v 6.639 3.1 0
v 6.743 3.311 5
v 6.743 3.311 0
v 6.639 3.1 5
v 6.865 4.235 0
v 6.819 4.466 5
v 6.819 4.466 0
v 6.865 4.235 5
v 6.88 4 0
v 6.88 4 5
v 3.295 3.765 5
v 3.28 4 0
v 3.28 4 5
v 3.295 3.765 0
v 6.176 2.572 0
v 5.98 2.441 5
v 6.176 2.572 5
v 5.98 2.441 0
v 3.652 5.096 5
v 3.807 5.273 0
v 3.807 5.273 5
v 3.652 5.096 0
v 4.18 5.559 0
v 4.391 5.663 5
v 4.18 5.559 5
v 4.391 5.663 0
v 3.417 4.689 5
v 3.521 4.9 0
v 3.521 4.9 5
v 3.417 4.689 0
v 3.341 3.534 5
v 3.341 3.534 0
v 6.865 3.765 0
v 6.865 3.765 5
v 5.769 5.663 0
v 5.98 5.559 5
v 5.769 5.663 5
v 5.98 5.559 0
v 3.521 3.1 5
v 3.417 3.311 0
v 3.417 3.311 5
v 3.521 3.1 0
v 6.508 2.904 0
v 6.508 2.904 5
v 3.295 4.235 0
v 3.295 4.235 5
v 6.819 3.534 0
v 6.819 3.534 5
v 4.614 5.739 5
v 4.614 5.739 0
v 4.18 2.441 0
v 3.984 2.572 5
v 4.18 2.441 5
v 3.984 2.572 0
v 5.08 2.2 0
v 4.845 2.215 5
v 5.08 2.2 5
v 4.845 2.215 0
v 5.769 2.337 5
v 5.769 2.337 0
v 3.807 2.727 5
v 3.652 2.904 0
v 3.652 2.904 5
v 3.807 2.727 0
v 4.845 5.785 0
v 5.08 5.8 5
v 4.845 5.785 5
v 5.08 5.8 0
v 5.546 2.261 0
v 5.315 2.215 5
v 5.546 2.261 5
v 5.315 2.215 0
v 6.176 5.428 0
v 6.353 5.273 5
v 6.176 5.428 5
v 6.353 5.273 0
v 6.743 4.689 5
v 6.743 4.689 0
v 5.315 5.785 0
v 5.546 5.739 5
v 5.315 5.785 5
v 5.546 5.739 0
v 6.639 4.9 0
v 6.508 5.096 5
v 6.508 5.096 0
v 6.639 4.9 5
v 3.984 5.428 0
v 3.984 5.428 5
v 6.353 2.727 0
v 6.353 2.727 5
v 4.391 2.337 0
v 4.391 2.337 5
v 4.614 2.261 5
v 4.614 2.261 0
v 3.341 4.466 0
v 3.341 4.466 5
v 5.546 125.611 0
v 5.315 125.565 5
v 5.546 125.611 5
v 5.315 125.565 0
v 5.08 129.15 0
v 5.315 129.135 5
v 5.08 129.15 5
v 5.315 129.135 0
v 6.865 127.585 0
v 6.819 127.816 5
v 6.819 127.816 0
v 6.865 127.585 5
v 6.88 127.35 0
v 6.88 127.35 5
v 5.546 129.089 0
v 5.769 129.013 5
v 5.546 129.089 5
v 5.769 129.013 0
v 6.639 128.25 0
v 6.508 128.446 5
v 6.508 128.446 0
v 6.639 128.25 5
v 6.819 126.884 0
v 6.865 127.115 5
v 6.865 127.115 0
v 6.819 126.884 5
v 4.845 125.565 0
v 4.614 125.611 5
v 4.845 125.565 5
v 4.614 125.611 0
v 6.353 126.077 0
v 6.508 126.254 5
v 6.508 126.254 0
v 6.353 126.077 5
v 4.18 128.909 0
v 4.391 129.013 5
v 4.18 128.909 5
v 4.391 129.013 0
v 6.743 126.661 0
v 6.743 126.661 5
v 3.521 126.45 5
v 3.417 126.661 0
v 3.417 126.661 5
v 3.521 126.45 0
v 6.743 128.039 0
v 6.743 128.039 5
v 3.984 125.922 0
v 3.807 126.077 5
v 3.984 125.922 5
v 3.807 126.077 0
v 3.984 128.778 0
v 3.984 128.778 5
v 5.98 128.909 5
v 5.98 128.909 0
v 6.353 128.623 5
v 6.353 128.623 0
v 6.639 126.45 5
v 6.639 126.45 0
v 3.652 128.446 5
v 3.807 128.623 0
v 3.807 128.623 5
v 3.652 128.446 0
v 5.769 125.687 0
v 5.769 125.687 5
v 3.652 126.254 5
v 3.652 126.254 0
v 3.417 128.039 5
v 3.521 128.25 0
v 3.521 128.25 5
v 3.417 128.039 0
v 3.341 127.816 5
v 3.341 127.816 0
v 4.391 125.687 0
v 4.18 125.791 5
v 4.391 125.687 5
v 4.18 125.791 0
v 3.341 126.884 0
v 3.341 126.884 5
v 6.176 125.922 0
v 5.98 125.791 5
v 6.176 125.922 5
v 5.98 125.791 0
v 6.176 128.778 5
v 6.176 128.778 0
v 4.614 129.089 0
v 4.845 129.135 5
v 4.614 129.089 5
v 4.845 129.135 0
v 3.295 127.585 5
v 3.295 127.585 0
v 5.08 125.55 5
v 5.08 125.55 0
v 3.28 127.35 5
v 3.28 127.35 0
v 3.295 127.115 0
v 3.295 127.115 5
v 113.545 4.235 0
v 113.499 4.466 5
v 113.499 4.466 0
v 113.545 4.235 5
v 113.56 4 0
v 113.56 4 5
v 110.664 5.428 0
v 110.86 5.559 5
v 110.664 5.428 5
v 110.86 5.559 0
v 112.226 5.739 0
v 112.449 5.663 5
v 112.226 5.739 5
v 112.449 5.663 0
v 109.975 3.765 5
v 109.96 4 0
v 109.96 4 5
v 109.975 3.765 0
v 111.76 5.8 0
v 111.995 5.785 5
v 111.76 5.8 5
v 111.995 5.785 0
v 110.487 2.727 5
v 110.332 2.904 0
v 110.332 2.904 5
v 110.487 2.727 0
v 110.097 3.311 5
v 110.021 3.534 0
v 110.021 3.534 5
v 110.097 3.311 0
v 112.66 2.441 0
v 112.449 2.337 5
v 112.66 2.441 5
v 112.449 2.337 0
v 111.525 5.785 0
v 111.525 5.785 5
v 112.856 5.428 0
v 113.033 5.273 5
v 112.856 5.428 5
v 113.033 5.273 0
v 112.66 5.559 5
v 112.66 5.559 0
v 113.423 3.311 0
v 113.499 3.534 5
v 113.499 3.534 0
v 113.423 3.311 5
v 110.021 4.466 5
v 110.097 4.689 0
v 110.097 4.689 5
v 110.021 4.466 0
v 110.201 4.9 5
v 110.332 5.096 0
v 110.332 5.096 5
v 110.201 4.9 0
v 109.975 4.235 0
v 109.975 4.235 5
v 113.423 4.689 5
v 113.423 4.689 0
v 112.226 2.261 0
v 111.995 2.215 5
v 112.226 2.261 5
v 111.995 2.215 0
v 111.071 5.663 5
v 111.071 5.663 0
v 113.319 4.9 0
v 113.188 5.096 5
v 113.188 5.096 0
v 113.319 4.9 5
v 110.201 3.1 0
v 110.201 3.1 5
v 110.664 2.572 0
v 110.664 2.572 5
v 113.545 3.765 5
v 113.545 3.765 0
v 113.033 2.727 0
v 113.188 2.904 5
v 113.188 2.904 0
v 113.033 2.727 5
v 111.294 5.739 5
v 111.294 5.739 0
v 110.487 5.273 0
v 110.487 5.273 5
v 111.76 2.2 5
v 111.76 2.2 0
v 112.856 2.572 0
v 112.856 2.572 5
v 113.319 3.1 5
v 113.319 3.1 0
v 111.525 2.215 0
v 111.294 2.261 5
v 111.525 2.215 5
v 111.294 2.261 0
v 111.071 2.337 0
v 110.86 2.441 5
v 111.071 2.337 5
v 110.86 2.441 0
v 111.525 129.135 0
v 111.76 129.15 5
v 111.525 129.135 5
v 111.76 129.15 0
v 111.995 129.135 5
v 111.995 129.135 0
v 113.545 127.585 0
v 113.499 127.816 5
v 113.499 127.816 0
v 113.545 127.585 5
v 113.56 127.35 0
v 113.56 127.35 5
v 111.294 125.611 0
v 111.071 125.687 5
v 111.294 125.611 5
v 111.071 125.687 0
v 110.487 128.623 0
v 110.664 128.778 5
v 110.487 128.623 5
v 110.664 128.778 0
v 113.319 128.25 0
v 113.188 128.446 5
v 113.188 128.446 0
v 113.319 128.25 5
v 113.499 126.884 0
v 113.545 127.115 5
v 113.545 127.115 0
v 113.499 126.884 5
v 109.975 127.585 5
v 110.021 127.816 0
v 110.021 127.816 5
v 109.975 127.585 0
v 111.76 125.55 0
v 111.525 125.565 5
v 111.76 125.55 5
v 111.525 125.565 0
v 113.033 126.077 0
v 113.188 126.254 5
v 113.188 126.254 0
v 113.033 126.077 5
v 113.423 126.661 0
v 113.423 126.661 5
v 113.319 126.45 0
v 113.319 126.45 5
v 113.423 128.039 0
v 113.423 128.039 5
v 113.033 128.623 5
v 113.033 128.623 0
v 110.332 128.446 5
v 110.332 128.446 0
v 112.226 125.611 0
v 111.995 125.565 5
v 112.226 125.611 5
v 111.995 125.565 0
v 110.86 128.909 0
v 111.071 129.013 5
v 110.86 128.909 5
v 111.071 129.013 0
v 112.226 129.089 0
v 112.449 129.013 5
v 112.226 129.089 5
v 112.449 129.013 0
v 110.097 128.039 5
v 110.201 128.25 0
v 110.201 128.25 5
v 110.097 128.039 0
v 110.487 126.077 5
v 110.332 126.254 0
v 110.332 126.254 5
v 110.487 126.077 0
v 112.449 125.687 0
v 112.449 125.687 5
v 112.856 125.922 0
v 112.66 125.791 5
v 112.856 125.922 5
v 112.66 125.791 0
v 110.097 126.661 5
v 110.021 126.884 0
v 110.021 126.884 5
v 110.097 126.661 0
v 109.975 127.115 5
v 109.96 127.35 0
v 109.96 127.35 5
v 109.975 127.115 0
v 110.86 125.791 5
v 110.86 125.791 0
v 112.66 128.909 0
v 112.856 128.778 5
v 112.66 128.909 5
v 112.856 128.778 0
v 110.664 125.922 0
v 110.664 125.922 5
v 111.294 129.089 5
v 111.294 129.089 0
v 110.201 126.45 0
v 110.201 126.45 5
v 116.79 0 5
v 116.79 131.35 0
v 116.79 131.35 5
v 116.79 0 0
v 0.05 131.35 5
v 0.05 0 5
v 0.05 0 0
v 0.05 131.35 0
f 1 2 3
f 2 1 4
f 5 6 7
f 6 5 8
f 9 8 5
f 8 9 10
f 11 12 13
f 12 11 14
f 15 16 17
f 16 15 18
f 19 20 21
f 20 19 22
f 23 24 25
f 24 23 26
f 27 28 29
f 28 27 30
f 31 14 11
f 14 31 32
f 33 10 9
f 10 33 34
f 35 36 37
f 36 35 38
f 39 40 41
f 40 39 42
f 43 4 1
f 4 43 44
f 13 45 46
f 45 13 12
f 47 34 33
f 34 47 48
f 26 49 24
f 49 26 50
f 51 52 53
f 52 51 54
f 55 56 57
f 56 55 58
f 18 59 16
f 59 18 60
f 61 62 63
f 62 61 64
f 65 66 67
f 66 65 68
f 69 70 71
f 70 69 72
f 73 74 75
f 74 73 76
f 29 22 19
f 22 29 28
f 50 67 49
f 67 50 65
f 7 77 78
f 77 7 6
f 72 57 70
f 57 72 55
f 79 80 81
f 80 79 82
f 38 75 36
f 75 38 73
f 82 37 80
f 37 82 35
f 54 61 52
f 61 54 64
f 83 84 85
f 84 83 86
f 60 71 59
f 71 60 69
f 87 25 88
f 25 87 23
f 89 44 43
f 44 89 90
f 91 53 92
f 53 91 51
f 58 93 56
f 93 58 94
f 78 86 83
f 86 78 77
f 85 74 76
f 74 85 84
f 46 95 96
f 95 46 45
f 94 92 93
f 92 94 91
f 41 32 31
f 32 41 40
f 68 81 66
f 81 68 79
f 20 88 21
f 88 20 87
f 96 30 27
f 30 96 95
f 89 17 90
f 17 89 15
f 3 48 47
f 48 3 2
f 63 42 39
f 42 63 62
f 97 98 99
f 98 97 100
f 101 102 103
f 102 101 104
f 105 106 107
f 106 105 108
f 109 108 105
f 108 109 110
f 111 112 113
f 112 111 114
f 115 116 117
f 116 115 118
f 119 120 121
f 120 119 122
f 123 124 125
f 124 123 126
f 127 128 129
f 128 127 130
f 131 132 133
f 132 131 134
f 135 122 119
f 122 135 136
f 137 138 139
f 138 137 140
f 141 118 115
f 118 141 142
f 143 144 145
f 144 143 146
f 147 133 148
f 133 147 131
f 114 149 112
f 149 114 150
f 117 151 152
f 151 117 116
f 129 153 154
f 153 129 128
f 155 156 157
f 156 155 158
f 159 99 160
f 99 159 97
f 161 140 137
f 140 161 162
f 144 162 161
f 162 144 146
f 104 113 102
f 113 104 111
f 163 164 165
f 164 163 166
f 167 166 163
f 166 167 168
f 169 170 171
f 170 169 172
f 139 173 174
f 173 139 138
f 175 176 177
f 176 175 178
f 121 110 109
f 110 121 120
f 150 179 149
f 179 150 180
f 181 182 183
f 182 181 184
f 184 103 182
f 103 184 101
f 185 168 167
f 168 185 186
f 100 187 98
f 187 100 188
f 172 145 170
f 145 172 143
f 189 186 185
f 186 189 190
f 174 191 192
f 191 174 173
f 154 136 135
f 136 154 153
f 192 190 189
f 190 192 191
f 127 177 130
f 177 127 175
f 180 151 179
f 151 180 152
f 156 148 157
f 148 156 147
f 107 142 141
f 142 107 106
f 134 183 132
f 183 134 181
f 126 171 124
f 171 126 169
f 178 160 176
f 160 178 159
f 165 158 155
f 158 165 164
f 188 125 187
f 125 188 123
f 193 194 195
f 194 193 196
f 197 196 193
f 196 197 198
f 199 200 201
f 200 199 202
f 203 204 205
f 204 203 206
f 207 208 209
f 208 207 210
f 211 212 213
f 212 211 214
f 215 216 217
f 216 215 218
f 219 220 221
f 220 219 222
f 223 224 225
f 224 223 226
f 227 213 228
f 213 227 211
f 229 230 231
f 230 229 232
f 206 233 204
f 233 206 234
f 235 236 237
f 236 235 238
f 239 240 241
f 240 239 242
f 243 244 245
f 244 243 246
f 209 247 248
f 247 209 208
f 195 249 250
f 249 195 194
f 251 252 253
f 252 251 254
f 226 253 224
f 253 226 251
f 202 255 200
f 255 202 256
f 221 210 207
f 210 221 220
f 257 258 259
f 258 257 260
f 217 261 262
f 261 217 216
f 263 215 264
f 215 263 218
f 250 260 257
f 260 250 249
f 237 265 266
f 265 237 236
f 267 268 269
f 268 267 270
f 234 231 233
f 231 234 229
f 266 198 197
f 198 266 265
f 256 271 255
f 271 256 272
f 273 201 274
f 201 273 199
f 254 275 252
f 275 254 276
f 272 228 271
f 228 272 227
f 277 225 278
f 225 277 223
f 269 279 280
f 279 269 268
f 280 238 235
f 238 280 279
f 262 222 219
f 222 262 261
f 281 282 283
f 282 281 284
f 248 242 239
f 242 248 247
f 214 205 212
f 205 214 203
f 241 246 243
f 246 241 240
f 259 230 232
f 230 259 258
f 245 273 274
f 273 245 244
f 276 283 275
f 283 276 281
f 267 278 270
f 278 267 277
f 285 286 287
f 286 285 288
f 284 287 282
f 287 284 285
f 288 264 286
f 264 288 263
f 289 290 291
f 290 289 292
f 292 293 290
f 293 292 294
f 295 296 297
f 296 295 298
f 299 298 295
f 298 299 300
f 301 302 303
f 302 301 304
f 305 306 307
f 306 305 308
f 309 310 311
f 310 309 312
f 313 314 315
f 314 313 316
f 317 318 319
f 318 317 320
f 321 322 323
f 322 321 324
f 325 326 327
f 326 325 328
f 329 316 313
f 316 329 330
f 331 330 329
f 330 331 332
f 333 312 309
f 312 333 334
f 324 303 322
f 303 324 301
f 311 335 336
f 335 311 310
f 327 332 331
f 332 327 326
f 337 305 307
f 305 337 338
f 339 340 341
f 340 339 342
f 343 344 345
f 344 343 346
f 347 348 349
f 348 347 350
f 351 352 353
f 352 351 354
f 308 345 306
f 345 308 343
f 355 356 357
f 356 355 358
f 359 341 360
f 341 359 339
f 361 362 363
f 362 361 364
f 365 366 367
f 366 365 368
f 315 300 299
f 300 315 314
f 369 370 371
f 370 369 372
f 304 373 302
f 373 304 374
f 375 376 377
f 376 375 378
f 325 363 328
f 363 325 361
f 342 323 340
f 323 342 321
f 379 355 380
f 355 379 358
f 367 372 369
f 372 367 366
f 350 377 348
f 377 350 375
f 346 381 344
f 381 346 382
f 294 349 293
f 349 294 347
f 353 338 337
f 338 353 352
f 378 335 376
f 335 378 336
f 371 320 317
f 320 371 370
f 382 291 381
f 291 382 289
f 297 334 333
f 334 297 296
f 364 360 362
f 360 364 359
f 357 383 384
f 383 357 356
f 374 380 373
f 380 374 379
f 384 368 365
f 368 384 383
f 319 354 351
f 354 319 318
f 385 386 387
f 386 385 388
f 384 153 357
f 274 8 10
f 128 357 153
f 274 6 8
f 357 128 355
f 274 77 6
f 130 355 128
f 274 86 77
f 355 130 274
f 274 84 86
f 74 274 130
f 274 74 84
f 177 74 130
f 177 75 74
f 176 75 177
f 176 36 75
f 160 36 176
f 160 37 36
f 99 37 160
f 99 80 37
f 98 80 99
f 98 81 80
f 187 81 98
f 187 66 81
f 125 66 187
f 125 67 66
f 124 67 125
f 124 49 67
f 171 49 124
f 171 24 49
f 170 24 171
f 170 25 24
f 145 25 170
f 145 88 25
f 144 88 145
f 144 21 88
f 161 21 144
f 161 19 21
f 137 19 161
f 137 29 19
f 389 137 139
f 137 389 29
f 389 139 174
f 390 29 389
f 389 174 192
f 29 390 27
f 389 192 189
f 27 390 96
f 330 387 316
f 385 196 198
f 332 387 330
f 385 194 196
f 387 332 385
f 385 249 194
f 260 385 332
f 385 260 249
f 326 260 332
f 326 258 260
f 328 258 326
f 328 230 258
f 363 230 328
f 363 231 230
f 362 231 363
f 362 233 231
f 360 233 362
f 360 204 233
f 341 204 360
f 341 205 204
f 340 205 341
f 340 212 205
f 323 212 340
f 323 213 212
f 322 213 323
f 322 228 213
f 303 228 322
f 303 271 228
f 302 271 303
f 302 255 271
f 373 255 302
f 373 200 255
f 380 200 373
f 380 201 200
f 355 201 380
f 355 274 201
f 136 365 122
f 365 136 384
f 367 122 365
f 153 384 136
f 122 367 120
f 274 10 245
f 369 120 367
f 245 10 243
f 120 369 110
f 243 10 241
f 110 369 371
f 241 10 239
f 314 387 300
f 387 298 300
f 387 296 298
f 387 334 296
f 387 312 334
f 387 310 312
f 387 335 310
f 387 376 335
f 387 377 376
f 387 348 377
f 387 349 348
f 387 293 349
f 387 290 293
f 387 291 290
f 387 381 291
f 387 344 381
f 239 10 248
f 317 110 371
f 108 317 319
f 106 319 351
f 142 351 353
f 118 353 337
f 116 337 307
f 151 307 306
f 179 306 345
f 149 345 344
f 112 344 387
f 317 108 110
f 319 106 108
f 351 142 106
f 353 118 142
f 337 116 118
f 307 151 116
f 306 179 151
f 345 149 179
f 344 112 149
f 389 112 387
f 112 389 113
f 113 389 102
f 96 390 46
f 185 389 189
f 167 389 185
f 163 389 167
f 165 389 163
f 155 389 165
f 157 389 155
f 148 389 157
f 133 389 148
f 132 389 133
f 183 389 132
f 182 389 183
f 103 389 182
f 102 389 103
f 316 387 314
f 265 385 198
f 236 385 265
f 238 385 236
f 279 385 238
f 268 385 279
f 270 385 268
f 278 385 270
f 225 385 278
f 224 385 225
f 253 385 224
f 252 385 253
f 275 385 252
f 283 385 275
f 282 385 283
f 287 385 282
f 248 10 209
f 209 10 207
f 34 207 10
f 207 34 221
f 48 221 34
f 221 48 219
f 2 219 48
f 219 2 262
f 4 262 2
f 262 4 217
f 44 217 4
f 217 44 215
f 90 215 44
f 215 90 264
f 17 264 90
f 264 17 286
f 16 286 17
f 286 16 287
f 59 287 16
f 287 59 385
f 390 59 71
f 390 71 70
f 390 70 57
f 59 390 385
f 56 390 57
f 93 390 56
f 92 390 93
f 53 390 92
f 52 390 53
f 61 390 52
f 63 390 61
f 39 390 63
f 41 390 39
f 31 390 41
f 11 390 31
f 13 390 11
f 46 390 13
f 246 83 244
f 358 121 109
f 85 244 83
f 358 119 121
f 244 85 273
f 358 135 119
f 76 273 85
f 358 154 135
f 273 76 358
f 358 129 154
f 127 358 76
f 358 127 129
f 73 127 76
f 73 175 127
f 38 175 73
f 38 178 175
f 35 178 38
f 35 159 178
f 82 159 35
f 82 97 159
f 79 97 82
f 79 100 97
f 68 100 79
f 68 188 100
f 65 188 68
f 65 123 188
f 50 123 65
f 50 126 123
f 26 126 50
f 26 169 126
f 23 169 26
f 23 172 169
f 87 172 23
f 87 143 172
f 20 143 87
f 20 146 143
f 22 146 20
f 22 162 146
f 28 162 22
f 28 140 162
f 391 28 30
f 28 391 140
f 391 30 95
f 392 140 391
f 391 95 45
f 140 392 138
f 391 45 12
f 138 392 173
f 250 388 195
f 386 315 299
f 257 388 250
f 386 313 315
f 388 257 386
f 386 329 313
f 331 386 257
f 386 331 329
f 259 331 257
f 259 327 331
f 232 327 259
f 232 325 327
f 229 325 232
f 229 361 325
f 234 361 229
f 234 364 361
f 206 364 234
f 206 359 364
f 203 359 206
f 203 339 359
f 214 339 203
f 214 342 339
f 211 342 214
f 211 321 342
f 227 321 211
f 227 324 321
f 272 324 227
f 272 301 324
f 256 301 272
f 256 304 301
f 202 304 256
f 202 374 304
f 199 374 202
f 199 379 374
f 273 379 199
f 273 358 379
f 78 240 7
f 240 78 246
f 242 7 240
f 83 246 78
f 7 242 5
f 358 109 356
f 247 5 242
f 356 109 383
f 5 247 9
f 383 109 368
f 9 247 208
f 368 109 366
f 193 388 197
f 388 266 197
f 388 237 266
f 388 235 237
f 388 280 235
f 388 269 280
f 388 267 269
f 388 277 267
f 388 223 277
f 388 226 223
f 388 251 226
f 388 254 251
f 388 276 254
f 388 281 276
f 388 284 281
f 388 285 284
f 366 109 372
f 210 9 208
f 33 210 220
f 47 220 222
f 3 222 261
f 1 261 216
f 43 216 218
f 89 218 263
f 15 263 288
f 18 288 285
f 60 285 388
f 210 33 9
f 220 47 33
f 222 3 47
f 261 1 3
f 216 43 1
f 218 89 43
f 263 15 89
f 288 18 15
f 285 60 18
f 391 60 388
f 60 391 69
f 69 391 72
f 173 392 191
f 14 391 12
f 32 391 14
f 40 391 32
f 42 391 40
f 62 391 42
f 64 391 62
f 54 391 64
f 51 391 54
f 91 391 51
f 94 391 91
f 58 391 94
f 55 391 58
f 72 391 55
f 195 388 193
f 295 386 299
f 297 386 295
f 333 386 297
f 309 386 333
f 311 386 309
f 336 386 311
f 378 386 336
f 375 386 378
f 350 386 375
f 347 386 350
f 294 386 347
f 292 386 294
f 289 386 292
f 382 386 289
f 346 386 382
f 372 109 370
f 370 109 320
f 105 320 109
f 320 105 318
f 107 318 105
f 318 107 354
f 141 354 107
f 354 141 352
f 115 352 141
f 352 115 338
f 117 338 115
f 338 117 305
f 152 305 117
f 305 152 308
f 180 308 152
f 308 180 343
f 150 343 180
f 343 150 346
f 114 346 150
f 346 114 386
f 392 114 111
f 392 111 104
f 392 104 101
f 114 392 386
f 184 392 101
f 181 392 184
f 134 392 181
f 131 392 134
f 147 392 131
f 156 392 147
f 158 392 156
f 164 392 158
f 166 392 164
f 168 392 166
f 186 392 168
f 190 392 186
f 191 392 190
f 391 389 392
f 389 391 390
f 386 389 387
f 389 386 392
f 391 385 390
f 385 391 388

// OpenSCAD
HE=44.45;
TE=5.08;

WIDTH= 23  * TE;
HEIGHT=3*HE-2;
THICKNESS=5;
EURORACK_HEIGHT=128.5;
PLUG_POSITION=[15,15,0];
COMB_MARGIN = 8;

// Mounting Hole Offset from the top / bottom edge
HOLE_OFFSET_Y = 4;
// Mounting Hole offset from the sides
HOLE_OFFSET_X = TE;
HOLE_RADIUS = 1.8;
// Number of Facets for the Holes. 
// A reasonably high number should be picked or else holes might end up to small
HOLE_FACETS = 48;

module plug_positive(){
  PLUG_HEIGHT=20.5;
  PLUG_WIDTH=27.5;
  cube([PLUG_WIDTH + 20, PLUG_HEIGHT + 20, THICKNESS]);
}
module plug_negative(){
  PLUG_HEIGHT=20.5;
  PLUG_WIDTH=27.5;
  PLUG_SCREW_DISTANCE = 40;
  PLUG_SCREWHOLE_RADIUS=1.55;
  PLUG_SCREW_OFFSET = (PLUG_SCREW_DISTANCE - PLUG_WIDTH) / 2;
  translate([10,10, -0.1])
  cube([PLUG_WIDTH, PLUG_HEIGHT, THICKNESS + 0.2]);
  translate([10 - PLUG_SCREW_OFFSET, 10 + PLUG_HEIGHT / 2, -0.1])
  cylinder(h = THICKNESS+0.2, r=PLUG_SCREWHOLE_RADIUS, center=false, $fn=HOLE_FACETS);
  translate([10 + PLUG_WIDTH + PLUG_SCREW_OFFSET, 10 + PLUG_HEIGHT / 2, -0.1])
  cylinder(h = THICKNESS+0.2, r=PLUG_SCREWHOLE_RADIUS, center=false, $fn=HOLE_FACETS);

}
 difference(){
    union(){
        translate([0.05,0,0])
        cube([WIDTH-0.1, HEIGHT, THICKNESS]);

    }
    
    // The four mounting holes
    for (x =[HOLE_OFFSET_X, WIDTH-HOLE_OFFSET_X]){
        for (y =[HOLE_OFFSET_Y, HEIGHT-HOLE_OFFSET_Y]){
            color([1,0,0])
            translate([x, y, -0.1]){
            cylinder(h = THICKNESS+0.2, r=HOLE_RADIUS, center=false, $fn=HOLE_FACETS); 
            };
        }
    };
}
